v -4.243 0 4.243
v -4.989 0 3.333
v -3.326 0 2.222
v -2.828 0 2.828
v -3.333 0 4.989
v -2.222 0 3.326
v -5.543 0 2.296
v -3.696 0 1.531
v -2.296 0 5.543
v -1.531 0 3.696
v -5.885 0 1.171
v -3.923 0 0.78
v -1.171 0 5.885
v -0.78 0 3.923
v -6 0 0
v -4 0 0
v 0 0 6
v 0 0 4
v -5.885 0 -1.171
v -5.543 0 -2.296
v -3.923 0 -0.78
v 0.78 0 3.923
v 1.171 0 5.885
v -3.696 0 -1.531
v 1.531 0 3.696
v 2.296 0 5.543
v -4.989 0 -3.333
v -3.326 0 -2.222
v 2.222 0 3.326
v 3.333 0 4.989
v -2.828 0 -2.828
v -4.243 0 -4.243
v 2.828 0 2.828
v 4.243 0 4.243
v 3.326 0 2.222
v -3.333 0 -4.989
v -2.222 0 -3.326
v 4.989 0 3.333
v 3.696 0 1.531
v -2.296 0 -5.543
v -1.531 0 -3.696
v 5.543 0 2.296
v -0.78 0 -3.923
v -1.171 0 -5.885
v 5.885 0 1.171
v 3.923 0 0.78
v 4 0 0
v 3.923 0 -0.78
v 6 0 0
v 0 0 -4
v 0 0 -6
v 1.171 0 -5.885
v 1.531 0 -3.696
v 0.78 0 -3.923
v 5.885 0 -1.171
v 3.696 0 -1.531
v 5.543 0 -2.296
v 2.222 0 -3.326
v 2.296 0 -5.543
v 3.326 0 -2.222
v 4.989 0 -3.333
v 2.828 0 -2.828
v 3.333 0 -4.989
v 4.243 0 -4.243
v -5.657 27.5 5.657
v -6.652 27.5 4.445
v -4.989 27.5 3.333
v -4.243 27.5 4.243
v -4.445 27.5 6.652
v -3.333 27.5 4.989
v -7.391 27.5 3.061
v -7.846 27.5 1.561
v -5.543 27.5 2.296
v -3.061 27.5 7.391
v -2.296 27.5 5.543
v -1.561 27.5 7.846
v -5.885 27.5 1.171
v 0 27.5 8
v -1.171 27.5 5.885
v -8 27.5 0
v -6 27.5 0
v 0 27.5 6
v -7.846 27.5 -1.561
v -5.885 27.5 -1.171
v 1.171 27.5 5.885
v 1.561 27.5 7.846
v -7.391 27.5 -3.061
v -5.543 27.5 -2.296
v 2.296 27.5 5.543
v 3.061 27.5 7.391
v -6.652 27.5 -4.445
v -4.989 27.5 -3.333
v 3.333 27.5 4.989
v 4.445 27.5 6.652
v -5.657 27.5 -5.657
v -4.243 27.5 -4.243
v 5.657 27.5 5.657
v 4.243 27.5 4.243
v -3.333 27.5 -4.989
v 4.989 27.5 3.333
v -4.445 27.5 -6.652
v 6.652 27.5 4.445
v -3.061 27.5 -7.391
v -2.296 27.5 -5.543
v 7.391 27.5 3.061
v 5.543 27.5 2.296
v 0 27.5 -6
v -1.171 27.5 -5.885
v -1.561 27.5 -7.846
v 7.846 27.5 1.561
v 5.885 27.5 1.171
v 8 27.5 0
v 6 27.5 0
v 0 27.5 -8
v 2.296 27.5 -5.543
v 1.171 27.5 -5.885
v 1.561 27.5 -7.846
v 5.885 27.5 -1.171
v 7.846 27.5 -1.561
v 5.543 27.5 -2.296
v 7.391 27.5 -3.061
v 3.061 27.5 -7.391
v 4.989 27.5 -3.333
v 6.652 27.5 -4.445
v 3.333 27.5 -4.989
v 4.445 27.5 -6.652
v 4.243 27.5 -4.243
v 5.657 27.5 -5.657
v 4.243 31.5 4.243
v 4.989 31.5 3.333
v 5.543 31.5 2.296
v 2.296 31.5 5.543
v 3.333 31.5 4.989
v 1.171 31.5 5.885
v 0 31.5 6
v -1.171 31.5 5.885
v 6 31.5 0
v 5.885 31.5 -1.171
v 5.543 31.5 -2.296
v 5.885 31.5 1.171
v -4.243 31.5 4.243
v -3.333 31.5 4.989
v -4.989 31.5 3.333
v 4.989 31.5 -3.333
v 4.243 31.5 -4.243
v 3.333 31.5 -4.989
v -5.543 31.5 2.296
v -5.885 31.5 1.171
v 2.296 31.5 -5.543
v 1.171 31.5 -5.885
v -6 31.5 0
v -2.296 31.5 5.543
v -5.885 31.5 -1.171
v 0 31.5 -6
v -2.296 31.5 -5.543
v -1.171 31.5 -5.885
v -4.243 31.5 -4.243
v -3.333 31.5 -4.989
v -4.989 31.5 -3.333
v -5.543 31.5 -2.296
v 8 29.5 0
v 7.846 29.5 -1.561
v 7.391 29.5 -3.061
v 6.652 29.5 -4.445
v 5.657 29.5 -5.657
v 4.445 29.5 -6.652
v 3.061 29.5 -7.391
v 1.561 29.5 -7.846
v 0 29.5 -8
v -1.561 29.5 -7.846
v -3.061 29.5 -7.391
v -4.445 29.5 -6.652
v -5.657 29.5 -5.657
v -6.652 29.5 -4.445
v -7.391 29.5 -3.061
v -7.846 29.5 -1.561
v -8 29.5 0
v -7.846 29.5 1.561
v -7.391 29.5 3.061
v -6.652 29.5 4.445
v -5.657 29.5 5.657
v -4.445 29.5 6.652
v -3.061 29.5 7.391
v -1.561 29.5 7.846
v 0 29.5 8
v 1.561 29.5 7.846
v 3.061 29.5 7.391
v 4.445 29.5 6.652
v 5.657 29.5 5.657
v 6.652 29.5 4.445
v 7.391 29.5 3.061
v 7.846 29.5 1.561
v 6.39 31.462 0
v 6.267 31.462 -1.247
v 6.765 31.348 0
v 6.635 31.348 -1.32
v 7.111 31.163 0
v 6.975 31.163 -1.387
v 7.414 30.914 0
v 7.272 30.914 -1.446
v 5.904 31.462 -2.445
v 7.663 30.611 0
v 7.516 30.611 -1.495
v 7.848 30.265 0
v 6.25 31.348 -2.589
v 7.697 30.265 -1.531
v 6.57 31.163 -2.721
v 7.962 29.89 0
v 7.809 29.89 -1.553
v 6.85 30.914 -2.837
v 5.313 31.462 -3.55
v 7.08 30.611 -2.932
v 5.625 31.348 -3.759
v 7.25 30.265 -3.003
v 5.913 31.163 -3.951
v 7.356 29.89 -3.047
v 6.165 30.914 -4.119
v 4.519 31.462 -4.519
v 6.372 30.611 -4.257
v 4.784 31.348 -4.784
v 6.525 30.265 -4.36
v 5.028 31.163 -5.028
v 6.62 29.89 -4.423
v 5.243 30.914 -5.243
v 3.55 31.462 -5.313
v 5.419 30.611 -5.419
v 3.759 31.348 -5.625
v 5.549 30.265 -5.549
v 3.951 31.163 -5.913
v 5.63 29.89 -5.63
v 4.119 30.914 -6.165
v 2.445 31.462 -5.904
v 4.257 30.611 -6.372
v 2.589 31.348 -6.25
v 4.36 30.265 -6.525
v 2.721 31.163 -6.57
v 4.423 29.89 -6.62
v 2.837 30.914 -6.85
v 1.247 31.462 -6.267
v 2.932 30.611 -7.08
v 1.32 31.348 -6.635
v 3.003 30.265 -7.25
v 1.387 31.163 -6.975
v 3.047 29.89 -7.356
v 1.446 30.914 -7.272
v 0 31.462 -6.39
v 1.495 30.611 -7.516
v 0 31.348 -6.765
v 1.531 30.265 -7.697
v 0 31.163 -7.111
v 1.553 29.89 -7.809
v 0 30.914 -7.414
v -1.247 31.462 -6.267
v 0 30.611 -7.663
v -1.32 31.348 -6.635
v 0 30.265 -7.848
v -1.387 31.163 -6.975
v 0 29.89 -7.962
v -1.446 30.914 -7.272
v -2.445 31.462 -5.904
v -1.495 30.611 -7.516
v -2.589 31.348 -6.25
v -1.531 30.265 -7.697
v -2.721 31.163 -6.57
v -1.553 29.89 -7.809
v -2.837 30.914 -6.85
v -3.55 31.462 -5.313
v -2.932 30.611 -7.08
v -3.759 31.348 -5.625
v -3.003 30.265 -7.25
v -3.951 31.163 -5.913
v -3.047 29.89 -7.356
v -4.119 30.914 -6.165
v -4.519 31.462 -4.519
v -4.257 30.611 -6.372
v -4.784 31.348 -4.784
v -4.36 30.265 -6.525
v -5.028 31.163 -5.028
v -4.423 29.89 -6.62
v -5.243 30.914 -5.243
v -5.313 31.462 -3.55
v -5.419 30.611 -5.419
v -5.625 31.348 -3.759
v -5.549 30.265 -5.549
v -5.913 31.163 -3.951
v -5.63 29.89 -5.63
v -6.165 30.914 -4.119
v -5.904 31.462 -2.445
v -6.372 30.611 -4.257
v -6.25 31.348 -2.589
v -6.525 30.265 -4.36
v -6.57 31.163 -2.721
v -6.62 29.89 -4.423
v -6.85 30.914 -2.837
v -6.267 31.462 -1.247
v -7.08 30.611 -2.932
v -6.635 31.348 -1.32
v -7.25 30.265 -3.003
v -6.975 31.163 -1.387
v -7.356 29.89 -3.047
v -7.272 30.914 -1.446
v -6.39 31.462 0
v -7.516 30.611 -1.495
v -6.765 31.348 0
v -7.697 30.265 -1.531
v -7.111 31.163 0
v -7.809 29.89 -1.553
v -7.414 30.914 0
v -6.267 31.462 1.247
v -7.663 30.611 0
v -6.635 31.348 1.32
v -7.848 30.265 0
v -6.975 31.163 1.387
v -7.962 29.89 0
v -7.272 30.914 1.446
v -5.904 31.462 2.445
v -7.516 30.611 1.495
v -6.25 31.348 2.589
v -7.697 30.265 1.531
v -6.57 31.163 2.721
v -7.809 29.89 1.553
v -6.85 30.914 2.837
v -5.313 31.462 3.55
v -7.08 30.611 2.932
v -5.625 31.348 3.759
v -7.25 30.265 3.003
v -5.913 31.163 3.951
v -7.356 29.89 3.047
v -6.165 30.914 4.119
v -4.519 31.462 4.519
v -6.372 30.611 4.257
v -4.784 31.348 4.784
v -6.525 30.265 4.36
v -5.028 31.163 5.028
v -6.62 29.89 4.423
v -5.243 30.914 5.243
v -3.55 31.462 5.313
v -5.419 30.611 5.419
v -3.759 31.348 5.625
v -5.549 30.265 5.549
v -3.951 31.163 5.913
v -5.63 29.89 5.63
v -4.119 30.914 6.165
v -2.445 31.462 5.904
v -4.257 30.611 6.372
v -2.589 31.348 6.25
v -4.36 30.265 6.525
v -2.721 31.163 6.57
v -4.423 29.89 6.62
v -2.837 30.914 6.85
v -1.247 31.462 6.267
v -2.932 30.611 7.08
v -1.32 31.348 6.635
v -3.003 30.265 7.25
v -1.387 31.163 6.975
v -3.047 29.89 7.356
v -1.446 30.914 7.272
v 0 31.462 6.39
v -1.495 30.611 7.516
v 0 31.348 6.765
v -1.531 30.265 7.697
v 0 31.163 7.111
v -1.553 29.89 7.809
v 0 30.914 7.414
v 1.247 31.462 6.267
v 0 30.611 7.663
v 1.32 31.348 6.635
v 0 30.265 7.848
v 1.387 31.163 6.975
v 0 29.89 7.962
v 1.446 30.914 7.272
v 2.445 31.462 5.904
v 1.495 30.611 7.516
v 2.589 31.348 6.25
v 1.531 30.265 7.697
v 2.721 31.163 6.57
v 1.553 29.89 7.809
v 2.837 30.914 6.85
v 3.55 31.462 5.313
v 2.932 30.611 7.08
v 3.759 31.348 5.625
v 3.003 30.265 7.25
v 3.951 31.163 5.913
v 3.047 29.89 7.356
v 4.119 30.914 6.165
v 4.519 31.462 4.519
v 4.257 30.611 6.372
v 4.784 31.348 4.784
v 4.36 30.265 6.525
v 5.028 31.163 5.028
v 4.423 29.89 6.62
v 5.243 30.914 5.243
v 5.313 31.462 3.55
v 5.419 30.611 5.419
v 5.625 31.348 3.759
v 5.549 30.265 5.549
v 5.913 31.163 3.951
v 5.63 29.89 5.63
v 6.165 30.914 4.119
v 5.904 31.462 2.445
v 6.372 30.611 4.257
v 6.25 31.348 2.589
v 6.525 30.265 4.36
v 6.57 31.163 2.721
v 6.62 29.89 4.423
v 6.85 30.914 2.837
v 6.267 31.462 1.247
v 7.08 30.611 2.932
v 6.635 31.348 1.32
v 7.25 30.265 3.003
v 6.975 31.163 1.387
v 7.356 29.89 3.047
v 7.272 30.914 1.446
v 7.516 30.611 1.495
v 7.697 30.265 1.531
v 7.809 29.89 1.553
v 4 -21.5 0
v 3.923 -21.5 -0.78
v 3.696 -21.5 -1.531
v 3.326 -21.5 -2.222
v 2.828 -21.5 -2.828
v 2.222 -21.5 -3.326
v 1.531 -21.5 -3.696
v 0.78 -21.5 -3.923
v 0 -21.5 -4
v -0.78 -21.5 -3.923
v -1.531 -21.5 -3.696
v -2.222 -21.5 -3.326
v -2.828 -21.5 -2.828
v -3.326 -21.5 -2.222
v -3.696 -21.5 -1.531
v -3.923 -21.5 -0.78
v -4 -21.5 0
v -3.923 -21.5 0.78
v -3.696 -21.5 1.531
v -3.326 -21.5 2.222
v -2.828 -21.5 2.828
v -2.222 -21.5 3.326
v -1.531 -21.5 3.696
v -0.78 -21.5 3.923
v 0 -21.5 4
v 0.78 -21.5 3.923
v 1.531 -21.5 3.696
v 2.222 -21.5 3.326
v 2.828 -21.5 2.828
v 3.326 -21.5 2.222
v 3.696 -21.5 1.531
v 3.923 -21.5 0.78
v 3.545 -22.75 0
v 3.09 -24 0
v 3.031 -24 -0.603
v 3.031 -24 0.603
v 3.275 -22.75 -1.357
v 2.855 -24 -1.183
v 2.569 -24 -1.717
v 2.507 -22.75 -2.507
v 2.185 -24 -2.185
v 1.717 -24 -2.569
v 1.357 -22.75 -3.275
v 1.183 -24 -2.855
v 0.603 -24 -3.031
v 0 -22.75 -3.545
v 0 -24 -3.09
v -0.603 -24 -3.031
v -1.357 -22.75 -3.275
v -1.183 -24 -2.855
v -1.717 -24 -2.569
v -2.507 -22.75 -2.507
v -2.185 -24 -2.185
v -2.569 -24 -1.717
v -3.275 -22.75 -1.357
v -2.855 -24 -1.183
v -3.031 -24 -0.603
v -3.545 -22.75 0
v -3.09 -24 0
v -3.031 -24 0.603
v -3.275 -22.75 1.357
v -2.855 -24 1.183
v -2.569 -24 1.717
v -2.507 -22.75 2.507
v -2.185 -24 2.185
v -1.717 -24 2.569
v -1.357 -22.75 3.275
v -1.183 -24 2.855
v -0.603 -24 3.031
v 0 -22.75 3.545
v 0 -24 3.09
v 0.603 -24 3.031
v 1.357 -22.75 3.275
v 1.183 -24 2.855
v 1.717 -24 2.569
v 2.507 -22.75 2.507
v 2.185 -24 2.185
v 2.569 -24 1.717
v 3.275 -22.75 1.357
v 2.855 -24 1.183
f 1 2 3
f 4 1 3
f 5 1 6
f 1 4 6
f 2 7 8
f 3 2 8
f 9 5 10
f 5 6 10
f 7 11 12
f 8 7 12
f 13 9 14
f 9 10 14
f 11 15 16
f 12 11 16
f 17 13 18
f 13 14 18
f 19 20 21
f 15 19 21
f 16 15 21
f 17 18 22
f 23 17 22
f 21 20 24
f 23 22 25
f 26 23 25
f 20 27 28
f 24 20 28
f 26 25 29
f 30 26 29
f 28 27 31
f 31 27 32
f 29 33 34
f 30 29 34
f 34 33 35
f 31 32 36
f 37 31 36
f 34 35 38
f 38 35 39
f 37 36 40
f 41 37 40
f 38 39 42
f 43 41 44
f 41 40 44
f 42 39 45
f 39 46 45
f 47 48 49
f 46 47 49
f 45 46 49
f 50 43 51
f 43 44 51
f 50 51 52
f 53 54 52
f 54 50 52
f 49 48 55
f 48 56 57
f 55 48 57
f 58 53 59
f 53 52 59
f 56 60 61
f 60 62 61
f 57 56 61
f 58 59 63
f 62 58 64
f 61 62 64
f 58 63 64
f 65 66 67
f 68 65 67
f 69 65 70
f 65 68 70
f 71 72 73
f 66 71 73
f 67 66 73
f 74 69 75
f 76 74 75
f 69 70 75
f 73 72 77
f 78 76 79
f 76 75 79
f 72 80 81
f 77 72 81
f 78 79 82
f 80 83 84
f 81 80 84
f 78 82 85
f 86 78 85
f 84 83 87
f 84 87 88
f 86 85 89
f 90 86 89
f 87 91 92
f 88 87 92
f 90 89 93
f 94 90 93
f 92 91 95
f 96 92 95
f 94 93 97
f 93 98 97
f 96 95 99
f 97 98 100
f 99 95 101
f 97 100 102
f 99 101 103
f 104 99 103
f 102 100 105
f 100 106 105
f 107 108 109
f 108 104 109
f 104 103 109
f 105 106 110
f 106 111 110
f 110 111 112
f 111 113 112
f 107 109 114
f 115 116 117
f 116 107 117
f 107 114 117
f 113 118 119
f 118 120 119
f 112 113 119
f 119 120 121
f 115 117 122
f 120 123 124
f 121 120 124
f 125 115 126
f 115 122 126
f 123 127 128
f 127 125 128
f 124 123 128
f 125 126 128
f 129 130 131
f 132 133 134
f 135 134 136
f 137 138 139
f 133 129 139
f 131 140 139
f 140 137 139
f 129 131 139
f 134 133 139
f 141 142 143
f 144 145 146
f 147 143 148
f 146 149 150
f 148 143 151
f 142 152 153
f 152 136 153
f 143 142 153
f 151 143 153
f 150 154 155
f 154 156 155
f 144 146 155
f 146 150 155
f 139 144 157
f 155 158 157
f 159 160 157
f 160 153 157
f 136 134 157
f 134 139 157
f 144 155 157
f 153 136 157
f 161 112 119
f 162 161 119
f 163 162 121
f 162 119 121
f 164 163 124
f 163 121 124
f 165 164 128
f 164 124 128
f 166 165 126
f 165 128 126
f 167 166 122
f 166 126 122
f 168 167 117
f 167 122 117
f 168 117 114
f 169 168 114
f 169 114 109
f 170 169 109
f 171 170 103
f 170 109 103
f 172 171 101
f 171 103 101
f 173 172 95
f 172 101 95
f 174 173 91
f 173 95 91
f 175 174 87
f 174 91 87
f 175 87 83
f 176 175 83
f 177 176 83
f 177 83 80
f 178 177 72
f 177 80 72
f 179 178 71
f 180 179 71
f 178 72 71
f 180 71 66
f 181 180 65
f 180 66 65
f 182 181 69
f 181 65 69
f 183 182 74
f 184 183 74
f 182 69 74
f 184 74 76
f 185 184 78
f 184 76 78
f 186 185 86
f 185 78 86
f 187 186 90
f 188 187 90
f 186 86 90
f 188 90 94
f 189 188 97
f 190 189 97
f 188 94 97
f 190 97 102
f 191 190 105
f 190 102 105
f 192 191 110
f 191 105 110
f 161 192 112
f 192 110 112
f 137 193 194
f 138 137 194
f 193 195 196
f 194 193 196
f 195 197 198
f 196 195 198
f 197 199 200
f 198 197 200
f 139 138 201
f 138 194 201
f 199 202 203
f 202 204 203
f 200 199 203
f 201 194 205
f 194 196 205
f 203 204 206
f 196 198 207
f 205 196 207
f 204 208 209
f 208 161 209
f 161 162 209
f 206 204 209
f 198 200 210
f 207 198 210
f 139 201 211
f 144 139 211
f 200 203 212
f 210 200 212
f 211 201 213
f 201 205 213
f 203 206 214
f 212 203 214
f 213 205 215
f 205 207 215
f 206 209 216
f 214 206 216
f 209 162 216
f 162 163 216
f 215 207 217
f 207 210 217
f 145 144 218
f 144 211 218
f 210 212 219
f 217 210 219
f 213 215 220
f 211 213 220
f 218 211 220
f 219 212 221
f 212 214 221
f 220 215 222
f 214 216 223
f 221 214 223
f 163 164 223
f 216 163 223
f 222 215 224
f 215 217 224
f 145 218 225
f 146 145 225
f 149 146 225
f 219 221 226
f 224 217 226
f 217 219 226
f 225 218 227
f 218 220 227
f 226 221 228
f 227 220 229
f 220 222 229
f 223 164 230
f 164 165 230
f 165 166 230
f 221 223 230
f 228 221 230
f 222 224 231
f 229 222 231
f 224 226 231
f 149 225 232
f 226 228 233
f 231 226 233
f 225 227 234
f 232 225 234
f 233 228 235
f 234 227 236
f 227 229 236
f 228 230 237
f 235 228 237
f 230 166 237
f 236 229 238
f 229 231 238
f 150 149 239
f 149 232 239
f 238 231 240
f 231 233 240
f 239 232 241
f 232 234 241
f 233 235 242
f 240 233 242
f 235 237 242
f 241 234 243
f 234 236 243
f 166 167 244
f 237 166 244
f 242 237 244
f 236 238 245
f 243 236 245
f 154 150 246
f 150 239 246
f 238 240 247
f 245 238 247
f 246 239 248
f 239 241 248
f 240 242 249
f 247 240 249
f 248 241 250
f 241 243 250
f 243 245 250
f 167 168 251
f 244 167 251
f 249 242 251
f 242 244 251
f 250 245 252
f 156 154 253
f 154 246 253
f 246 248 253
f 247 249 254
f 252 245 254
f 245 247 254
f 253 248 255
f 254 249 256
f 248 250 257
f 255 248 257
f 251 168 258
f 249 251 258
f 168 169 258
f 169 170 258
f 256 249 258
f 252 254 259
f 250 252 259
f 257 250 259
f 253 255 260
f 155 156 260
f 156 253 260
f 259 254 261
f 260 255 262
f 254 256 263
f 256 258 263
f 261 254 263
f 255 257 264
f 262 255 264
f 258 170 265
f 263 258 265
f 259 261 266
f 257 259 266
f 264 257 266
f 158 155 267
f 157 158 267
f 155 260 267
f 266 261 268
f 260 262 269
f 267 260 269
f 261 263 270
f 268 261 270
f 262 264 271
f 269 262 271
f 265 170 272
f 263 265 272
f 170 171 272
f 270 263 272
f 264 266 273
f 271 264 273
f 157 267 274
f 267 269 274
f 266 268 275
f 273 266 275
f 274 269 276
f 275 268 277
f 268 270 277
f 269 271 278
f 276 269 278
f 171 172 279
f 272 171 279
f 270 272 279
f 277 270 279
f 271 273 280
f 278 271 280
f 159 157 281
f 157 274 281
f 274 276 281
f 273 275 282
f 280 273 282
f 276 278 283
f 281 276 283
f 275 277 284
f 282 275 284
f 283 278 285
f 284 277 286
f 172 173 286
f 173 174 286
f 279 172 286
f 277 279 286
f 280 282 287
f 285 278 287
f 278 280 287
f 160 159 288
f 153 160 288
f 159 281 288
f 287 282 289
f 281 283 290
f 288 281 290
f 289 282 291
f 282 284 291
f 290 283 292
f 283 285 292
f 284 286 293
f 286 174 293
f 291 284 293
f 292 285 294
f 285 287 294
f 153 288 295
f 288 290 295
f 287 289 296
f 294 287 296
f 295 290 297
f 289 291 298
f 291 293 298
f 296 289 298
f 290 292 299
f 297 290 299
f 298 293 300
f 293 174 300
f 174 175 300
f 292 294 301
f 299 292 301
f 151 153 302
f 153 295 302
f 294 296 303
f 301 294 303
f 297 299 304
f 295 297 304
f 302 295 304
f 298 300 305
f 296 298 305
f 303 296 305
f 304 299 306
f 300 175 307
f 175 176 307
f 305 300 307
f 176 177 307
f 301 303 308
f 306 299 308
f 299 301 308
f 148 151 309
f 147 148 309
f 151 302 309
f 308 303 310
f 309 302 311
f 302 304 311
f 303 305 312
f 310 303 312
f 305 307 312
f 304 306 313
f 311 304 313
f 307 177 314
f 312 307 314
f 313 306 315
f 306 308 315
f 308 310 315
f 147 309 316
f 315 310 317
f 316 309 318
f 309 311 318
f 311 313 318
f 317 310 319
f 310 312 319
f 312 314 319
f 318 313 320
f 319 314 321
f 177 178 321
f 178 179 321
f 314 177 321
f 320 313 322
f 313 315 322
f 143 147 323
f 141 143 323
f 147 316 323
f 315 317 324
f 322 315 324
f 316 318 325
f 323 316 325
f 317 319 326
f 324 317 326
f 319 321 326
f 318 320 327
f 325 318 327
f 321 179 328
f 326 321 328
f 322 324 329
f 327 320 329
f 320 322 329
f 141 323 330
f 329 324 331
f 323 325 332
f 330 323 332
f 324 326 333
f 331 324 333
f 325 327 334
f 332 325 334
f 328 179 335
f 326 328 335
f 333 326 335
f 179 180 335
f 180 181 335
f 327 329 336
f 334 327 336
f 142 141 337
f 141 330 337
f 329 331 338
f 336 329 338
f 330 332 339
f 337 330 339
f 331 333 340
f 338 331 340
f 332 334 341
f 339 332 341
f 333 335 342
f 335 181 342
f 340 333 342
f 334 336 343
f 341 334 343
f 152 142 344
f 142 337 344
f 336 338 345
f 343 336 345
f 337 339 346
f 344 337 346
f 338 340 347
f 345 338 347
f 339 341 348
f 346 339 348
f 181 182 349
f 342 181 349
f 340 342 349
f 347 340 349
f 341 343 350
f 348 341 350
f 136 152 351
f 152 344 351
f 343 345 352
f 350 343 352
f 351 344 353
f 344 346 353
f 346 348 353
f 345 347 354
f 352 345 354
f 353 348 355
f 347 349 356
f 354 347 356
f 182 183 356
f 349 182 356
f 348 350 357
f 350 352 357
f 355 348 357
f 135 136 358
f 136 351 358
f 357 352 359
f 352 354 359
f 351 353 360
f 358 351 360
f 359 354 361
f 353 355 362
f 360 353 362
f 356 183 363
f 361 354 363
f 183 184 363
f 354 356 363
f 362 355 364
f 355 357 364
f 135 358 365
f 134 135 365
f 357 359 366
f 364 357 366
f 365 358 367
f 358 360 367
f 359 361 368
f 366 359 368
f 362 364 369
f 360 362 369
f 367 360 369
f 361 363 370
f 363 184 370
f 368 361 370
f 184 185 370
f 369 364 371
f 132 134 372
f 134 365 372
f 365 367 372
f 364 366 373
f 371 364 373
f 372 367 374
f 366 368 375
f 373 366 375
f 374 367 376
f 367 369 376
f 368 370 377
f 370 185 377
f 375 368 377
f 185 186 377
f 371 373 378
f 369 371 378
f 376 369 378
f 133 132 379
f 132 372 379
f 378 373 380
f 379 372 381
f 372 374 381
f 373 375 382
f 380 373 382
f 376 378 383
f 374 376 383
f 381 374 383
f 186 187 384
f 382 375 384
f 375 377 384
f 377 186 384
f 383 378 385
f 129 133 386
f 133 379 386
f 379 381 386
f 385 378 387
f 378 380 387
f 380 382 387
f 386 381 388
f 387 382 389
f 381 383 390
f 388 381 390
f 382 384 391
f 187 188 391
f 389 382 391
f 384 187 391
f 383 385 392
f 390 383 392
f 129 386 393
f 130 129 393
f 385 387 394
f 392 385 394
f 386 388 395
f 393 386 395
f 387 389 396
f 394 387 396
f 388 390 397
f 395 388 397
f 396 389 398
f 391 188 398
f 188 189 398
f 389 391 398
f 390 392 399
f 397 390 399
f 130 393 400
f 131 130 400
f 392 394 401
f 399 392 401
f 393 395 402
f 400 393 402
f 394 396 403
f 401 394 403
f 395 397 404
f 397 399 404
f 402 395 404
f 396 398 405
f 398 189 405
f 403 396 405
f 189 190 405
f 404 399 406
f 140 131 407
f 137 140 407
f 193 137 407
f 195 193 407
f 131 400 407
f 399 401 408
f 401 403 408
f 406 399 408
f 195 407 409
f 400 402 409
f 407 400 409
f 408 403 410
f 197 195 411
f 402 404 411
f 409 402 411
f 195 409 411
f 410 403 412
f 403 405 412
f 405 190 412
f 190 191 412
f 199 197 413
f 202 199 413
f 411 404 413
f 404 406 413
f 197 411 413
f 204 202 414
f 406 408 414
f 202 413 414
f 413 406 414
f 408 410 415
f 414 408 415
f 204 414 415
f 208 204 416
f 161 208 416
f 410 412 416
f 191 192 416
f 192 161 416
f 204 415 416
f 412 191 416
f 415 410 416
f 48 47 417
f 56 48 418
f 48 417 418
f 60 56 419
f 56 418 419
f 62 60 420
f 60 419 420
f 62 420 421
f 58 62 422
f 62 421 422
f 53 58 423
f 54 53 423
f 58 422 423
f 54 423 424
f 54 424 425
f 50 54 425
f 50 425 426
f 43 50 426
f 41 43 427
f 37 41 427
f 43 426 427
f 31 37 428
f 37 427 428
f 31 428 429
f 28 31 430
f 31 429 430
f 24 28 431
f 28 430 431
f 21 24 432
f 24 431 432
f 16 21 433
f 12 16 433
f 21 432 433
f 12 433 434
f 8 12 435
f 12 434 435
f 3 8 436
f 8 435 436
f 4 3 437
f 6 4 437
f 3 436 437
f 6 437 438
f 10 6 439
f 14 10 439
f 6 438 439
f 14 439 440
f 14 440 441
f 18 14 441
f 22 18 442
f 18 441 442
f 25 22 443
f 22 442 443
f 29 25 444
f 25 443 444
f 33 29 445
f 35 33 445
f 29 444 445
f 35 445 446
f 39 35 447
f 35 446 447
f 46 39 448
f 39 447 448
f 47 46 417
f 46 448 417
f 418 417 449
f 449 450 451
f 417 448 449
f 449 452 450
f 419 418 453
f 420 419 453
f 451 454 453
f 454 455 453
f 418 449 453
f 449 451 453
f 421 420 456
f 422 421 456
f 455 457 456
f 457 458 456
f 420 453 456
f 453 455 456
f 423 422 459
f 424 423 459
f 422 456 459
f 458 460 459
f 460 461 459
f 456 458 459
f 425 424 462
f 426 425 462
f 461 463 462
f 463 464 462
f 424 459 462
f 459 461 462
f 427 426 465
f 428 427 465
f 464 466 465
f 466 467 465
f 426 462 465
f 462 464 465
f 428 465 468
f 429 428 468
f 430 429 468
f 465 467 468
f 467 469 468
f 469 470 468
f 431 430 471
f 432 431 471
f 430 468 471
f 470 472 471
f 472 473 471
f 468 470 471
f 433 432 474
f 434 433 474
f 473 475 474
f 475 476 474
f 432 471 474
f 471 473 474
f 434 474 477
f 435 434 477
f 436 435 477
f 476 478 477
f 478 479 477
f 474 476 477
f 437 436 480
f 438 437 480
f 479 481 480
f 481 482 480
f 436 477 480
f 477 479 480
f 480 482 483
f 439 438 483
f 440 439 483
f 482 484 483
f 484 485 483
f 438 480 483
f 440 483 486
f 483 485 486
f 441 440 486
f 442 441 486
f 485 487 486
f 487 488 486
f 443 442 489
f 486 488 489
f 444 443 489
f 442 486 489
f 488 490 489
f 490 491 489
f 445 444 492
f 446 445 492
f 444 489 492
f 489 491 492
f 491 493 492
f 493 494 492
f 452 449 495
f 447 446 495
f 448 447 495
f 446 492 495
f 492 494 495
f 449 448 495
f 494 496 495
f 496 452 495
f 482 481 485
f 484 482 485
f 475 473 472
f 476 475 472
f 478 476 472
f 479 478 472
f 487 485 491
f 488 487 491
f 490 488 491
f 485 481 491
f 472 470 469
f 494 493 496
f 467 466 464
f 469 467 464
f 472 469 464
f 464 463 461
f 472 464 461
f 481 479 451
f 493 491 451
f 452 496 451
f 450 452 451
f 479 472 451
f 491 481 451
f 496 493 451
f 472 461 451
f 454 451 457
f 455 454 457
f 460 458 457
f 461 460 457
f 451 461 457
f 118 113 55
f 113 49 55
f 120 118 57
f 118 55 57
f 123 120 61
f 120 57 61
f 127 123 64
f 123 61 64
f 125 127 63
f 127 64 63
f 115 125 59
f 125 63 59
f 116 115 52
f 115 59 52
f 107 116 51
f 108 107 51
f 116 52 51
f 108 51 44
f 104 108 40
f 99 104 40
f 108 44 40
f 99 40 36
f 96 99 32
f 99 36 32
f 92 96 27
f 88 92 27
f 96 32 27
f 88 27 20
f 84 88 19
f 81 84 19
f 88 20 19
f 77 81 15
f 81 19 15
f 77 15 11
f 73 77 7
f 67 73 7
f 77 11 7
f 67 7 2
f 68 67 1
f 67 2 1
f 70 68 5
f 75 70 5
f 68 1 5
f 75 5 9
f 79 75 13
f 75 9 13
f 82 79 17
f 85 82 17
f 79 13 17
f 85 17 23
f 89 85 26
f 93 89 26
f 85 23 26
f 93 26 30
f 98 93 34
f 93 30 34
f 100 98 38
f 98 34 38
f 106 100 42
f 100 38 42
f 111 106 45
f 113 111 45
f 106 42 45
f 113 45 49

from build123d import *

# Parameters (mm, degrees)
FILETE1_R = 2


with BuildPart() as part:
    # Esboço1 → Revolução1 (revolve)
    with BuildSketch(Plane.XY):
        Polygon((0, 31.5), (8, 31.5), (8, 27.5), (6, 27.5), (6, 0), (4, 0), (4, -21.5), (3.090074414, -24), (0, -24), align=None)
    revolve(axis=Axis((0, -53.197951274, 0), (0, 1, 0)))

    # Filete1
    filete1_edges = [part.edges().sort_by_distance(p)[0] for p in [
        (-8, 31.5, 0),
    ]]
    fillet(filete1_edges, radius=FILETE1_R)


solid = part.part
